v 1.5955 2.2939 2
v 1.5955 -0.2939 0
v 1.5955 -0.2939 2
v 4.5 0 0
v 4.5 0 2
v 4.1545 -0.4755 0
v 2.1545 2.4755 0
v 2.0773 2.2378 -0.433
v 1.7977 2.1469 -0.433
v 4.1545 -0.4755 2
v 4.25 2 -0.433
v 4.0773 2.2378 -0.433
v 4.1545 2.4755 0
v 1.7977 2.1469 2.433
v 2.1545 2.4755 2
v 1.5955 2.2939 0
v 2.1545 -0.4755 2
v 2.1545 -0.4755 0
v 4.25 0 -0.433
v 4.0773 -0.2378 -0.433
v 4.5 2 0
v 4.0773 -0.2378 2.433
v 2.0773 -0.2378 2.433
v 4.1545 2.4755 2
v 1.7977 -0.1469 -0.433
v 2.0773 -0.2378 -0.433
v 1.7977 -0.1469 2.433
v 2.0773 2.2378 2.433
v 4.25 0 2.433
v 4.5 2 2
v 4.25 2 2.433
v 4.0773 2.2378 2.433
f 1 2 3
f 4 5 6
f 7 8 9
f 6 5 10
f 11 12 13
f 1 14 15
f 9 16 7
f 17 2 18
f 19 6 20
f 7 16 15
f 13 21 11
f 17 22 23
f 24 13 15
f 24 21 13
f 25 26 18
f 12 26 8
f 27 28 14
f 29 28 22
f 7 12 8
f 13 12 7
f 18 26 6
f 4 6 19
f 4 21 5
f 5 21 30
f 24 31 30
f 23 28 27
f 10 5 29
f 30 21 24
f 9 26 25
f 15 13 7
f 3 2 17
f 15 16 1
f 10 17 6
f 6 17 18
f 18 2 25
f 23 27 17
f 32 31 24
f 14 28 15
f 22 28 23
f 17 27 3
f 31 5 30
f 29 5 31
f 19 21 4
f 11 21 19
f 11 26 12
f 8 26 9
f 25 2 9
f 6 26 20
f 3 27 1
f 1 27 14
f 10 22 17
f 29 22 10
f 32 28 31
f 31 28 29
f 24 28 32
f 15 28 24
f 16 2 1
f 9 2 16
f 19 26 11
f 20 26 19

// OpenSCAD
// Refused: one sphere can round one solid, not two.
minkowski() {
  cube(1);
  translate([2, 0, 0]) cube(1);
  sphere(0.5);
}
